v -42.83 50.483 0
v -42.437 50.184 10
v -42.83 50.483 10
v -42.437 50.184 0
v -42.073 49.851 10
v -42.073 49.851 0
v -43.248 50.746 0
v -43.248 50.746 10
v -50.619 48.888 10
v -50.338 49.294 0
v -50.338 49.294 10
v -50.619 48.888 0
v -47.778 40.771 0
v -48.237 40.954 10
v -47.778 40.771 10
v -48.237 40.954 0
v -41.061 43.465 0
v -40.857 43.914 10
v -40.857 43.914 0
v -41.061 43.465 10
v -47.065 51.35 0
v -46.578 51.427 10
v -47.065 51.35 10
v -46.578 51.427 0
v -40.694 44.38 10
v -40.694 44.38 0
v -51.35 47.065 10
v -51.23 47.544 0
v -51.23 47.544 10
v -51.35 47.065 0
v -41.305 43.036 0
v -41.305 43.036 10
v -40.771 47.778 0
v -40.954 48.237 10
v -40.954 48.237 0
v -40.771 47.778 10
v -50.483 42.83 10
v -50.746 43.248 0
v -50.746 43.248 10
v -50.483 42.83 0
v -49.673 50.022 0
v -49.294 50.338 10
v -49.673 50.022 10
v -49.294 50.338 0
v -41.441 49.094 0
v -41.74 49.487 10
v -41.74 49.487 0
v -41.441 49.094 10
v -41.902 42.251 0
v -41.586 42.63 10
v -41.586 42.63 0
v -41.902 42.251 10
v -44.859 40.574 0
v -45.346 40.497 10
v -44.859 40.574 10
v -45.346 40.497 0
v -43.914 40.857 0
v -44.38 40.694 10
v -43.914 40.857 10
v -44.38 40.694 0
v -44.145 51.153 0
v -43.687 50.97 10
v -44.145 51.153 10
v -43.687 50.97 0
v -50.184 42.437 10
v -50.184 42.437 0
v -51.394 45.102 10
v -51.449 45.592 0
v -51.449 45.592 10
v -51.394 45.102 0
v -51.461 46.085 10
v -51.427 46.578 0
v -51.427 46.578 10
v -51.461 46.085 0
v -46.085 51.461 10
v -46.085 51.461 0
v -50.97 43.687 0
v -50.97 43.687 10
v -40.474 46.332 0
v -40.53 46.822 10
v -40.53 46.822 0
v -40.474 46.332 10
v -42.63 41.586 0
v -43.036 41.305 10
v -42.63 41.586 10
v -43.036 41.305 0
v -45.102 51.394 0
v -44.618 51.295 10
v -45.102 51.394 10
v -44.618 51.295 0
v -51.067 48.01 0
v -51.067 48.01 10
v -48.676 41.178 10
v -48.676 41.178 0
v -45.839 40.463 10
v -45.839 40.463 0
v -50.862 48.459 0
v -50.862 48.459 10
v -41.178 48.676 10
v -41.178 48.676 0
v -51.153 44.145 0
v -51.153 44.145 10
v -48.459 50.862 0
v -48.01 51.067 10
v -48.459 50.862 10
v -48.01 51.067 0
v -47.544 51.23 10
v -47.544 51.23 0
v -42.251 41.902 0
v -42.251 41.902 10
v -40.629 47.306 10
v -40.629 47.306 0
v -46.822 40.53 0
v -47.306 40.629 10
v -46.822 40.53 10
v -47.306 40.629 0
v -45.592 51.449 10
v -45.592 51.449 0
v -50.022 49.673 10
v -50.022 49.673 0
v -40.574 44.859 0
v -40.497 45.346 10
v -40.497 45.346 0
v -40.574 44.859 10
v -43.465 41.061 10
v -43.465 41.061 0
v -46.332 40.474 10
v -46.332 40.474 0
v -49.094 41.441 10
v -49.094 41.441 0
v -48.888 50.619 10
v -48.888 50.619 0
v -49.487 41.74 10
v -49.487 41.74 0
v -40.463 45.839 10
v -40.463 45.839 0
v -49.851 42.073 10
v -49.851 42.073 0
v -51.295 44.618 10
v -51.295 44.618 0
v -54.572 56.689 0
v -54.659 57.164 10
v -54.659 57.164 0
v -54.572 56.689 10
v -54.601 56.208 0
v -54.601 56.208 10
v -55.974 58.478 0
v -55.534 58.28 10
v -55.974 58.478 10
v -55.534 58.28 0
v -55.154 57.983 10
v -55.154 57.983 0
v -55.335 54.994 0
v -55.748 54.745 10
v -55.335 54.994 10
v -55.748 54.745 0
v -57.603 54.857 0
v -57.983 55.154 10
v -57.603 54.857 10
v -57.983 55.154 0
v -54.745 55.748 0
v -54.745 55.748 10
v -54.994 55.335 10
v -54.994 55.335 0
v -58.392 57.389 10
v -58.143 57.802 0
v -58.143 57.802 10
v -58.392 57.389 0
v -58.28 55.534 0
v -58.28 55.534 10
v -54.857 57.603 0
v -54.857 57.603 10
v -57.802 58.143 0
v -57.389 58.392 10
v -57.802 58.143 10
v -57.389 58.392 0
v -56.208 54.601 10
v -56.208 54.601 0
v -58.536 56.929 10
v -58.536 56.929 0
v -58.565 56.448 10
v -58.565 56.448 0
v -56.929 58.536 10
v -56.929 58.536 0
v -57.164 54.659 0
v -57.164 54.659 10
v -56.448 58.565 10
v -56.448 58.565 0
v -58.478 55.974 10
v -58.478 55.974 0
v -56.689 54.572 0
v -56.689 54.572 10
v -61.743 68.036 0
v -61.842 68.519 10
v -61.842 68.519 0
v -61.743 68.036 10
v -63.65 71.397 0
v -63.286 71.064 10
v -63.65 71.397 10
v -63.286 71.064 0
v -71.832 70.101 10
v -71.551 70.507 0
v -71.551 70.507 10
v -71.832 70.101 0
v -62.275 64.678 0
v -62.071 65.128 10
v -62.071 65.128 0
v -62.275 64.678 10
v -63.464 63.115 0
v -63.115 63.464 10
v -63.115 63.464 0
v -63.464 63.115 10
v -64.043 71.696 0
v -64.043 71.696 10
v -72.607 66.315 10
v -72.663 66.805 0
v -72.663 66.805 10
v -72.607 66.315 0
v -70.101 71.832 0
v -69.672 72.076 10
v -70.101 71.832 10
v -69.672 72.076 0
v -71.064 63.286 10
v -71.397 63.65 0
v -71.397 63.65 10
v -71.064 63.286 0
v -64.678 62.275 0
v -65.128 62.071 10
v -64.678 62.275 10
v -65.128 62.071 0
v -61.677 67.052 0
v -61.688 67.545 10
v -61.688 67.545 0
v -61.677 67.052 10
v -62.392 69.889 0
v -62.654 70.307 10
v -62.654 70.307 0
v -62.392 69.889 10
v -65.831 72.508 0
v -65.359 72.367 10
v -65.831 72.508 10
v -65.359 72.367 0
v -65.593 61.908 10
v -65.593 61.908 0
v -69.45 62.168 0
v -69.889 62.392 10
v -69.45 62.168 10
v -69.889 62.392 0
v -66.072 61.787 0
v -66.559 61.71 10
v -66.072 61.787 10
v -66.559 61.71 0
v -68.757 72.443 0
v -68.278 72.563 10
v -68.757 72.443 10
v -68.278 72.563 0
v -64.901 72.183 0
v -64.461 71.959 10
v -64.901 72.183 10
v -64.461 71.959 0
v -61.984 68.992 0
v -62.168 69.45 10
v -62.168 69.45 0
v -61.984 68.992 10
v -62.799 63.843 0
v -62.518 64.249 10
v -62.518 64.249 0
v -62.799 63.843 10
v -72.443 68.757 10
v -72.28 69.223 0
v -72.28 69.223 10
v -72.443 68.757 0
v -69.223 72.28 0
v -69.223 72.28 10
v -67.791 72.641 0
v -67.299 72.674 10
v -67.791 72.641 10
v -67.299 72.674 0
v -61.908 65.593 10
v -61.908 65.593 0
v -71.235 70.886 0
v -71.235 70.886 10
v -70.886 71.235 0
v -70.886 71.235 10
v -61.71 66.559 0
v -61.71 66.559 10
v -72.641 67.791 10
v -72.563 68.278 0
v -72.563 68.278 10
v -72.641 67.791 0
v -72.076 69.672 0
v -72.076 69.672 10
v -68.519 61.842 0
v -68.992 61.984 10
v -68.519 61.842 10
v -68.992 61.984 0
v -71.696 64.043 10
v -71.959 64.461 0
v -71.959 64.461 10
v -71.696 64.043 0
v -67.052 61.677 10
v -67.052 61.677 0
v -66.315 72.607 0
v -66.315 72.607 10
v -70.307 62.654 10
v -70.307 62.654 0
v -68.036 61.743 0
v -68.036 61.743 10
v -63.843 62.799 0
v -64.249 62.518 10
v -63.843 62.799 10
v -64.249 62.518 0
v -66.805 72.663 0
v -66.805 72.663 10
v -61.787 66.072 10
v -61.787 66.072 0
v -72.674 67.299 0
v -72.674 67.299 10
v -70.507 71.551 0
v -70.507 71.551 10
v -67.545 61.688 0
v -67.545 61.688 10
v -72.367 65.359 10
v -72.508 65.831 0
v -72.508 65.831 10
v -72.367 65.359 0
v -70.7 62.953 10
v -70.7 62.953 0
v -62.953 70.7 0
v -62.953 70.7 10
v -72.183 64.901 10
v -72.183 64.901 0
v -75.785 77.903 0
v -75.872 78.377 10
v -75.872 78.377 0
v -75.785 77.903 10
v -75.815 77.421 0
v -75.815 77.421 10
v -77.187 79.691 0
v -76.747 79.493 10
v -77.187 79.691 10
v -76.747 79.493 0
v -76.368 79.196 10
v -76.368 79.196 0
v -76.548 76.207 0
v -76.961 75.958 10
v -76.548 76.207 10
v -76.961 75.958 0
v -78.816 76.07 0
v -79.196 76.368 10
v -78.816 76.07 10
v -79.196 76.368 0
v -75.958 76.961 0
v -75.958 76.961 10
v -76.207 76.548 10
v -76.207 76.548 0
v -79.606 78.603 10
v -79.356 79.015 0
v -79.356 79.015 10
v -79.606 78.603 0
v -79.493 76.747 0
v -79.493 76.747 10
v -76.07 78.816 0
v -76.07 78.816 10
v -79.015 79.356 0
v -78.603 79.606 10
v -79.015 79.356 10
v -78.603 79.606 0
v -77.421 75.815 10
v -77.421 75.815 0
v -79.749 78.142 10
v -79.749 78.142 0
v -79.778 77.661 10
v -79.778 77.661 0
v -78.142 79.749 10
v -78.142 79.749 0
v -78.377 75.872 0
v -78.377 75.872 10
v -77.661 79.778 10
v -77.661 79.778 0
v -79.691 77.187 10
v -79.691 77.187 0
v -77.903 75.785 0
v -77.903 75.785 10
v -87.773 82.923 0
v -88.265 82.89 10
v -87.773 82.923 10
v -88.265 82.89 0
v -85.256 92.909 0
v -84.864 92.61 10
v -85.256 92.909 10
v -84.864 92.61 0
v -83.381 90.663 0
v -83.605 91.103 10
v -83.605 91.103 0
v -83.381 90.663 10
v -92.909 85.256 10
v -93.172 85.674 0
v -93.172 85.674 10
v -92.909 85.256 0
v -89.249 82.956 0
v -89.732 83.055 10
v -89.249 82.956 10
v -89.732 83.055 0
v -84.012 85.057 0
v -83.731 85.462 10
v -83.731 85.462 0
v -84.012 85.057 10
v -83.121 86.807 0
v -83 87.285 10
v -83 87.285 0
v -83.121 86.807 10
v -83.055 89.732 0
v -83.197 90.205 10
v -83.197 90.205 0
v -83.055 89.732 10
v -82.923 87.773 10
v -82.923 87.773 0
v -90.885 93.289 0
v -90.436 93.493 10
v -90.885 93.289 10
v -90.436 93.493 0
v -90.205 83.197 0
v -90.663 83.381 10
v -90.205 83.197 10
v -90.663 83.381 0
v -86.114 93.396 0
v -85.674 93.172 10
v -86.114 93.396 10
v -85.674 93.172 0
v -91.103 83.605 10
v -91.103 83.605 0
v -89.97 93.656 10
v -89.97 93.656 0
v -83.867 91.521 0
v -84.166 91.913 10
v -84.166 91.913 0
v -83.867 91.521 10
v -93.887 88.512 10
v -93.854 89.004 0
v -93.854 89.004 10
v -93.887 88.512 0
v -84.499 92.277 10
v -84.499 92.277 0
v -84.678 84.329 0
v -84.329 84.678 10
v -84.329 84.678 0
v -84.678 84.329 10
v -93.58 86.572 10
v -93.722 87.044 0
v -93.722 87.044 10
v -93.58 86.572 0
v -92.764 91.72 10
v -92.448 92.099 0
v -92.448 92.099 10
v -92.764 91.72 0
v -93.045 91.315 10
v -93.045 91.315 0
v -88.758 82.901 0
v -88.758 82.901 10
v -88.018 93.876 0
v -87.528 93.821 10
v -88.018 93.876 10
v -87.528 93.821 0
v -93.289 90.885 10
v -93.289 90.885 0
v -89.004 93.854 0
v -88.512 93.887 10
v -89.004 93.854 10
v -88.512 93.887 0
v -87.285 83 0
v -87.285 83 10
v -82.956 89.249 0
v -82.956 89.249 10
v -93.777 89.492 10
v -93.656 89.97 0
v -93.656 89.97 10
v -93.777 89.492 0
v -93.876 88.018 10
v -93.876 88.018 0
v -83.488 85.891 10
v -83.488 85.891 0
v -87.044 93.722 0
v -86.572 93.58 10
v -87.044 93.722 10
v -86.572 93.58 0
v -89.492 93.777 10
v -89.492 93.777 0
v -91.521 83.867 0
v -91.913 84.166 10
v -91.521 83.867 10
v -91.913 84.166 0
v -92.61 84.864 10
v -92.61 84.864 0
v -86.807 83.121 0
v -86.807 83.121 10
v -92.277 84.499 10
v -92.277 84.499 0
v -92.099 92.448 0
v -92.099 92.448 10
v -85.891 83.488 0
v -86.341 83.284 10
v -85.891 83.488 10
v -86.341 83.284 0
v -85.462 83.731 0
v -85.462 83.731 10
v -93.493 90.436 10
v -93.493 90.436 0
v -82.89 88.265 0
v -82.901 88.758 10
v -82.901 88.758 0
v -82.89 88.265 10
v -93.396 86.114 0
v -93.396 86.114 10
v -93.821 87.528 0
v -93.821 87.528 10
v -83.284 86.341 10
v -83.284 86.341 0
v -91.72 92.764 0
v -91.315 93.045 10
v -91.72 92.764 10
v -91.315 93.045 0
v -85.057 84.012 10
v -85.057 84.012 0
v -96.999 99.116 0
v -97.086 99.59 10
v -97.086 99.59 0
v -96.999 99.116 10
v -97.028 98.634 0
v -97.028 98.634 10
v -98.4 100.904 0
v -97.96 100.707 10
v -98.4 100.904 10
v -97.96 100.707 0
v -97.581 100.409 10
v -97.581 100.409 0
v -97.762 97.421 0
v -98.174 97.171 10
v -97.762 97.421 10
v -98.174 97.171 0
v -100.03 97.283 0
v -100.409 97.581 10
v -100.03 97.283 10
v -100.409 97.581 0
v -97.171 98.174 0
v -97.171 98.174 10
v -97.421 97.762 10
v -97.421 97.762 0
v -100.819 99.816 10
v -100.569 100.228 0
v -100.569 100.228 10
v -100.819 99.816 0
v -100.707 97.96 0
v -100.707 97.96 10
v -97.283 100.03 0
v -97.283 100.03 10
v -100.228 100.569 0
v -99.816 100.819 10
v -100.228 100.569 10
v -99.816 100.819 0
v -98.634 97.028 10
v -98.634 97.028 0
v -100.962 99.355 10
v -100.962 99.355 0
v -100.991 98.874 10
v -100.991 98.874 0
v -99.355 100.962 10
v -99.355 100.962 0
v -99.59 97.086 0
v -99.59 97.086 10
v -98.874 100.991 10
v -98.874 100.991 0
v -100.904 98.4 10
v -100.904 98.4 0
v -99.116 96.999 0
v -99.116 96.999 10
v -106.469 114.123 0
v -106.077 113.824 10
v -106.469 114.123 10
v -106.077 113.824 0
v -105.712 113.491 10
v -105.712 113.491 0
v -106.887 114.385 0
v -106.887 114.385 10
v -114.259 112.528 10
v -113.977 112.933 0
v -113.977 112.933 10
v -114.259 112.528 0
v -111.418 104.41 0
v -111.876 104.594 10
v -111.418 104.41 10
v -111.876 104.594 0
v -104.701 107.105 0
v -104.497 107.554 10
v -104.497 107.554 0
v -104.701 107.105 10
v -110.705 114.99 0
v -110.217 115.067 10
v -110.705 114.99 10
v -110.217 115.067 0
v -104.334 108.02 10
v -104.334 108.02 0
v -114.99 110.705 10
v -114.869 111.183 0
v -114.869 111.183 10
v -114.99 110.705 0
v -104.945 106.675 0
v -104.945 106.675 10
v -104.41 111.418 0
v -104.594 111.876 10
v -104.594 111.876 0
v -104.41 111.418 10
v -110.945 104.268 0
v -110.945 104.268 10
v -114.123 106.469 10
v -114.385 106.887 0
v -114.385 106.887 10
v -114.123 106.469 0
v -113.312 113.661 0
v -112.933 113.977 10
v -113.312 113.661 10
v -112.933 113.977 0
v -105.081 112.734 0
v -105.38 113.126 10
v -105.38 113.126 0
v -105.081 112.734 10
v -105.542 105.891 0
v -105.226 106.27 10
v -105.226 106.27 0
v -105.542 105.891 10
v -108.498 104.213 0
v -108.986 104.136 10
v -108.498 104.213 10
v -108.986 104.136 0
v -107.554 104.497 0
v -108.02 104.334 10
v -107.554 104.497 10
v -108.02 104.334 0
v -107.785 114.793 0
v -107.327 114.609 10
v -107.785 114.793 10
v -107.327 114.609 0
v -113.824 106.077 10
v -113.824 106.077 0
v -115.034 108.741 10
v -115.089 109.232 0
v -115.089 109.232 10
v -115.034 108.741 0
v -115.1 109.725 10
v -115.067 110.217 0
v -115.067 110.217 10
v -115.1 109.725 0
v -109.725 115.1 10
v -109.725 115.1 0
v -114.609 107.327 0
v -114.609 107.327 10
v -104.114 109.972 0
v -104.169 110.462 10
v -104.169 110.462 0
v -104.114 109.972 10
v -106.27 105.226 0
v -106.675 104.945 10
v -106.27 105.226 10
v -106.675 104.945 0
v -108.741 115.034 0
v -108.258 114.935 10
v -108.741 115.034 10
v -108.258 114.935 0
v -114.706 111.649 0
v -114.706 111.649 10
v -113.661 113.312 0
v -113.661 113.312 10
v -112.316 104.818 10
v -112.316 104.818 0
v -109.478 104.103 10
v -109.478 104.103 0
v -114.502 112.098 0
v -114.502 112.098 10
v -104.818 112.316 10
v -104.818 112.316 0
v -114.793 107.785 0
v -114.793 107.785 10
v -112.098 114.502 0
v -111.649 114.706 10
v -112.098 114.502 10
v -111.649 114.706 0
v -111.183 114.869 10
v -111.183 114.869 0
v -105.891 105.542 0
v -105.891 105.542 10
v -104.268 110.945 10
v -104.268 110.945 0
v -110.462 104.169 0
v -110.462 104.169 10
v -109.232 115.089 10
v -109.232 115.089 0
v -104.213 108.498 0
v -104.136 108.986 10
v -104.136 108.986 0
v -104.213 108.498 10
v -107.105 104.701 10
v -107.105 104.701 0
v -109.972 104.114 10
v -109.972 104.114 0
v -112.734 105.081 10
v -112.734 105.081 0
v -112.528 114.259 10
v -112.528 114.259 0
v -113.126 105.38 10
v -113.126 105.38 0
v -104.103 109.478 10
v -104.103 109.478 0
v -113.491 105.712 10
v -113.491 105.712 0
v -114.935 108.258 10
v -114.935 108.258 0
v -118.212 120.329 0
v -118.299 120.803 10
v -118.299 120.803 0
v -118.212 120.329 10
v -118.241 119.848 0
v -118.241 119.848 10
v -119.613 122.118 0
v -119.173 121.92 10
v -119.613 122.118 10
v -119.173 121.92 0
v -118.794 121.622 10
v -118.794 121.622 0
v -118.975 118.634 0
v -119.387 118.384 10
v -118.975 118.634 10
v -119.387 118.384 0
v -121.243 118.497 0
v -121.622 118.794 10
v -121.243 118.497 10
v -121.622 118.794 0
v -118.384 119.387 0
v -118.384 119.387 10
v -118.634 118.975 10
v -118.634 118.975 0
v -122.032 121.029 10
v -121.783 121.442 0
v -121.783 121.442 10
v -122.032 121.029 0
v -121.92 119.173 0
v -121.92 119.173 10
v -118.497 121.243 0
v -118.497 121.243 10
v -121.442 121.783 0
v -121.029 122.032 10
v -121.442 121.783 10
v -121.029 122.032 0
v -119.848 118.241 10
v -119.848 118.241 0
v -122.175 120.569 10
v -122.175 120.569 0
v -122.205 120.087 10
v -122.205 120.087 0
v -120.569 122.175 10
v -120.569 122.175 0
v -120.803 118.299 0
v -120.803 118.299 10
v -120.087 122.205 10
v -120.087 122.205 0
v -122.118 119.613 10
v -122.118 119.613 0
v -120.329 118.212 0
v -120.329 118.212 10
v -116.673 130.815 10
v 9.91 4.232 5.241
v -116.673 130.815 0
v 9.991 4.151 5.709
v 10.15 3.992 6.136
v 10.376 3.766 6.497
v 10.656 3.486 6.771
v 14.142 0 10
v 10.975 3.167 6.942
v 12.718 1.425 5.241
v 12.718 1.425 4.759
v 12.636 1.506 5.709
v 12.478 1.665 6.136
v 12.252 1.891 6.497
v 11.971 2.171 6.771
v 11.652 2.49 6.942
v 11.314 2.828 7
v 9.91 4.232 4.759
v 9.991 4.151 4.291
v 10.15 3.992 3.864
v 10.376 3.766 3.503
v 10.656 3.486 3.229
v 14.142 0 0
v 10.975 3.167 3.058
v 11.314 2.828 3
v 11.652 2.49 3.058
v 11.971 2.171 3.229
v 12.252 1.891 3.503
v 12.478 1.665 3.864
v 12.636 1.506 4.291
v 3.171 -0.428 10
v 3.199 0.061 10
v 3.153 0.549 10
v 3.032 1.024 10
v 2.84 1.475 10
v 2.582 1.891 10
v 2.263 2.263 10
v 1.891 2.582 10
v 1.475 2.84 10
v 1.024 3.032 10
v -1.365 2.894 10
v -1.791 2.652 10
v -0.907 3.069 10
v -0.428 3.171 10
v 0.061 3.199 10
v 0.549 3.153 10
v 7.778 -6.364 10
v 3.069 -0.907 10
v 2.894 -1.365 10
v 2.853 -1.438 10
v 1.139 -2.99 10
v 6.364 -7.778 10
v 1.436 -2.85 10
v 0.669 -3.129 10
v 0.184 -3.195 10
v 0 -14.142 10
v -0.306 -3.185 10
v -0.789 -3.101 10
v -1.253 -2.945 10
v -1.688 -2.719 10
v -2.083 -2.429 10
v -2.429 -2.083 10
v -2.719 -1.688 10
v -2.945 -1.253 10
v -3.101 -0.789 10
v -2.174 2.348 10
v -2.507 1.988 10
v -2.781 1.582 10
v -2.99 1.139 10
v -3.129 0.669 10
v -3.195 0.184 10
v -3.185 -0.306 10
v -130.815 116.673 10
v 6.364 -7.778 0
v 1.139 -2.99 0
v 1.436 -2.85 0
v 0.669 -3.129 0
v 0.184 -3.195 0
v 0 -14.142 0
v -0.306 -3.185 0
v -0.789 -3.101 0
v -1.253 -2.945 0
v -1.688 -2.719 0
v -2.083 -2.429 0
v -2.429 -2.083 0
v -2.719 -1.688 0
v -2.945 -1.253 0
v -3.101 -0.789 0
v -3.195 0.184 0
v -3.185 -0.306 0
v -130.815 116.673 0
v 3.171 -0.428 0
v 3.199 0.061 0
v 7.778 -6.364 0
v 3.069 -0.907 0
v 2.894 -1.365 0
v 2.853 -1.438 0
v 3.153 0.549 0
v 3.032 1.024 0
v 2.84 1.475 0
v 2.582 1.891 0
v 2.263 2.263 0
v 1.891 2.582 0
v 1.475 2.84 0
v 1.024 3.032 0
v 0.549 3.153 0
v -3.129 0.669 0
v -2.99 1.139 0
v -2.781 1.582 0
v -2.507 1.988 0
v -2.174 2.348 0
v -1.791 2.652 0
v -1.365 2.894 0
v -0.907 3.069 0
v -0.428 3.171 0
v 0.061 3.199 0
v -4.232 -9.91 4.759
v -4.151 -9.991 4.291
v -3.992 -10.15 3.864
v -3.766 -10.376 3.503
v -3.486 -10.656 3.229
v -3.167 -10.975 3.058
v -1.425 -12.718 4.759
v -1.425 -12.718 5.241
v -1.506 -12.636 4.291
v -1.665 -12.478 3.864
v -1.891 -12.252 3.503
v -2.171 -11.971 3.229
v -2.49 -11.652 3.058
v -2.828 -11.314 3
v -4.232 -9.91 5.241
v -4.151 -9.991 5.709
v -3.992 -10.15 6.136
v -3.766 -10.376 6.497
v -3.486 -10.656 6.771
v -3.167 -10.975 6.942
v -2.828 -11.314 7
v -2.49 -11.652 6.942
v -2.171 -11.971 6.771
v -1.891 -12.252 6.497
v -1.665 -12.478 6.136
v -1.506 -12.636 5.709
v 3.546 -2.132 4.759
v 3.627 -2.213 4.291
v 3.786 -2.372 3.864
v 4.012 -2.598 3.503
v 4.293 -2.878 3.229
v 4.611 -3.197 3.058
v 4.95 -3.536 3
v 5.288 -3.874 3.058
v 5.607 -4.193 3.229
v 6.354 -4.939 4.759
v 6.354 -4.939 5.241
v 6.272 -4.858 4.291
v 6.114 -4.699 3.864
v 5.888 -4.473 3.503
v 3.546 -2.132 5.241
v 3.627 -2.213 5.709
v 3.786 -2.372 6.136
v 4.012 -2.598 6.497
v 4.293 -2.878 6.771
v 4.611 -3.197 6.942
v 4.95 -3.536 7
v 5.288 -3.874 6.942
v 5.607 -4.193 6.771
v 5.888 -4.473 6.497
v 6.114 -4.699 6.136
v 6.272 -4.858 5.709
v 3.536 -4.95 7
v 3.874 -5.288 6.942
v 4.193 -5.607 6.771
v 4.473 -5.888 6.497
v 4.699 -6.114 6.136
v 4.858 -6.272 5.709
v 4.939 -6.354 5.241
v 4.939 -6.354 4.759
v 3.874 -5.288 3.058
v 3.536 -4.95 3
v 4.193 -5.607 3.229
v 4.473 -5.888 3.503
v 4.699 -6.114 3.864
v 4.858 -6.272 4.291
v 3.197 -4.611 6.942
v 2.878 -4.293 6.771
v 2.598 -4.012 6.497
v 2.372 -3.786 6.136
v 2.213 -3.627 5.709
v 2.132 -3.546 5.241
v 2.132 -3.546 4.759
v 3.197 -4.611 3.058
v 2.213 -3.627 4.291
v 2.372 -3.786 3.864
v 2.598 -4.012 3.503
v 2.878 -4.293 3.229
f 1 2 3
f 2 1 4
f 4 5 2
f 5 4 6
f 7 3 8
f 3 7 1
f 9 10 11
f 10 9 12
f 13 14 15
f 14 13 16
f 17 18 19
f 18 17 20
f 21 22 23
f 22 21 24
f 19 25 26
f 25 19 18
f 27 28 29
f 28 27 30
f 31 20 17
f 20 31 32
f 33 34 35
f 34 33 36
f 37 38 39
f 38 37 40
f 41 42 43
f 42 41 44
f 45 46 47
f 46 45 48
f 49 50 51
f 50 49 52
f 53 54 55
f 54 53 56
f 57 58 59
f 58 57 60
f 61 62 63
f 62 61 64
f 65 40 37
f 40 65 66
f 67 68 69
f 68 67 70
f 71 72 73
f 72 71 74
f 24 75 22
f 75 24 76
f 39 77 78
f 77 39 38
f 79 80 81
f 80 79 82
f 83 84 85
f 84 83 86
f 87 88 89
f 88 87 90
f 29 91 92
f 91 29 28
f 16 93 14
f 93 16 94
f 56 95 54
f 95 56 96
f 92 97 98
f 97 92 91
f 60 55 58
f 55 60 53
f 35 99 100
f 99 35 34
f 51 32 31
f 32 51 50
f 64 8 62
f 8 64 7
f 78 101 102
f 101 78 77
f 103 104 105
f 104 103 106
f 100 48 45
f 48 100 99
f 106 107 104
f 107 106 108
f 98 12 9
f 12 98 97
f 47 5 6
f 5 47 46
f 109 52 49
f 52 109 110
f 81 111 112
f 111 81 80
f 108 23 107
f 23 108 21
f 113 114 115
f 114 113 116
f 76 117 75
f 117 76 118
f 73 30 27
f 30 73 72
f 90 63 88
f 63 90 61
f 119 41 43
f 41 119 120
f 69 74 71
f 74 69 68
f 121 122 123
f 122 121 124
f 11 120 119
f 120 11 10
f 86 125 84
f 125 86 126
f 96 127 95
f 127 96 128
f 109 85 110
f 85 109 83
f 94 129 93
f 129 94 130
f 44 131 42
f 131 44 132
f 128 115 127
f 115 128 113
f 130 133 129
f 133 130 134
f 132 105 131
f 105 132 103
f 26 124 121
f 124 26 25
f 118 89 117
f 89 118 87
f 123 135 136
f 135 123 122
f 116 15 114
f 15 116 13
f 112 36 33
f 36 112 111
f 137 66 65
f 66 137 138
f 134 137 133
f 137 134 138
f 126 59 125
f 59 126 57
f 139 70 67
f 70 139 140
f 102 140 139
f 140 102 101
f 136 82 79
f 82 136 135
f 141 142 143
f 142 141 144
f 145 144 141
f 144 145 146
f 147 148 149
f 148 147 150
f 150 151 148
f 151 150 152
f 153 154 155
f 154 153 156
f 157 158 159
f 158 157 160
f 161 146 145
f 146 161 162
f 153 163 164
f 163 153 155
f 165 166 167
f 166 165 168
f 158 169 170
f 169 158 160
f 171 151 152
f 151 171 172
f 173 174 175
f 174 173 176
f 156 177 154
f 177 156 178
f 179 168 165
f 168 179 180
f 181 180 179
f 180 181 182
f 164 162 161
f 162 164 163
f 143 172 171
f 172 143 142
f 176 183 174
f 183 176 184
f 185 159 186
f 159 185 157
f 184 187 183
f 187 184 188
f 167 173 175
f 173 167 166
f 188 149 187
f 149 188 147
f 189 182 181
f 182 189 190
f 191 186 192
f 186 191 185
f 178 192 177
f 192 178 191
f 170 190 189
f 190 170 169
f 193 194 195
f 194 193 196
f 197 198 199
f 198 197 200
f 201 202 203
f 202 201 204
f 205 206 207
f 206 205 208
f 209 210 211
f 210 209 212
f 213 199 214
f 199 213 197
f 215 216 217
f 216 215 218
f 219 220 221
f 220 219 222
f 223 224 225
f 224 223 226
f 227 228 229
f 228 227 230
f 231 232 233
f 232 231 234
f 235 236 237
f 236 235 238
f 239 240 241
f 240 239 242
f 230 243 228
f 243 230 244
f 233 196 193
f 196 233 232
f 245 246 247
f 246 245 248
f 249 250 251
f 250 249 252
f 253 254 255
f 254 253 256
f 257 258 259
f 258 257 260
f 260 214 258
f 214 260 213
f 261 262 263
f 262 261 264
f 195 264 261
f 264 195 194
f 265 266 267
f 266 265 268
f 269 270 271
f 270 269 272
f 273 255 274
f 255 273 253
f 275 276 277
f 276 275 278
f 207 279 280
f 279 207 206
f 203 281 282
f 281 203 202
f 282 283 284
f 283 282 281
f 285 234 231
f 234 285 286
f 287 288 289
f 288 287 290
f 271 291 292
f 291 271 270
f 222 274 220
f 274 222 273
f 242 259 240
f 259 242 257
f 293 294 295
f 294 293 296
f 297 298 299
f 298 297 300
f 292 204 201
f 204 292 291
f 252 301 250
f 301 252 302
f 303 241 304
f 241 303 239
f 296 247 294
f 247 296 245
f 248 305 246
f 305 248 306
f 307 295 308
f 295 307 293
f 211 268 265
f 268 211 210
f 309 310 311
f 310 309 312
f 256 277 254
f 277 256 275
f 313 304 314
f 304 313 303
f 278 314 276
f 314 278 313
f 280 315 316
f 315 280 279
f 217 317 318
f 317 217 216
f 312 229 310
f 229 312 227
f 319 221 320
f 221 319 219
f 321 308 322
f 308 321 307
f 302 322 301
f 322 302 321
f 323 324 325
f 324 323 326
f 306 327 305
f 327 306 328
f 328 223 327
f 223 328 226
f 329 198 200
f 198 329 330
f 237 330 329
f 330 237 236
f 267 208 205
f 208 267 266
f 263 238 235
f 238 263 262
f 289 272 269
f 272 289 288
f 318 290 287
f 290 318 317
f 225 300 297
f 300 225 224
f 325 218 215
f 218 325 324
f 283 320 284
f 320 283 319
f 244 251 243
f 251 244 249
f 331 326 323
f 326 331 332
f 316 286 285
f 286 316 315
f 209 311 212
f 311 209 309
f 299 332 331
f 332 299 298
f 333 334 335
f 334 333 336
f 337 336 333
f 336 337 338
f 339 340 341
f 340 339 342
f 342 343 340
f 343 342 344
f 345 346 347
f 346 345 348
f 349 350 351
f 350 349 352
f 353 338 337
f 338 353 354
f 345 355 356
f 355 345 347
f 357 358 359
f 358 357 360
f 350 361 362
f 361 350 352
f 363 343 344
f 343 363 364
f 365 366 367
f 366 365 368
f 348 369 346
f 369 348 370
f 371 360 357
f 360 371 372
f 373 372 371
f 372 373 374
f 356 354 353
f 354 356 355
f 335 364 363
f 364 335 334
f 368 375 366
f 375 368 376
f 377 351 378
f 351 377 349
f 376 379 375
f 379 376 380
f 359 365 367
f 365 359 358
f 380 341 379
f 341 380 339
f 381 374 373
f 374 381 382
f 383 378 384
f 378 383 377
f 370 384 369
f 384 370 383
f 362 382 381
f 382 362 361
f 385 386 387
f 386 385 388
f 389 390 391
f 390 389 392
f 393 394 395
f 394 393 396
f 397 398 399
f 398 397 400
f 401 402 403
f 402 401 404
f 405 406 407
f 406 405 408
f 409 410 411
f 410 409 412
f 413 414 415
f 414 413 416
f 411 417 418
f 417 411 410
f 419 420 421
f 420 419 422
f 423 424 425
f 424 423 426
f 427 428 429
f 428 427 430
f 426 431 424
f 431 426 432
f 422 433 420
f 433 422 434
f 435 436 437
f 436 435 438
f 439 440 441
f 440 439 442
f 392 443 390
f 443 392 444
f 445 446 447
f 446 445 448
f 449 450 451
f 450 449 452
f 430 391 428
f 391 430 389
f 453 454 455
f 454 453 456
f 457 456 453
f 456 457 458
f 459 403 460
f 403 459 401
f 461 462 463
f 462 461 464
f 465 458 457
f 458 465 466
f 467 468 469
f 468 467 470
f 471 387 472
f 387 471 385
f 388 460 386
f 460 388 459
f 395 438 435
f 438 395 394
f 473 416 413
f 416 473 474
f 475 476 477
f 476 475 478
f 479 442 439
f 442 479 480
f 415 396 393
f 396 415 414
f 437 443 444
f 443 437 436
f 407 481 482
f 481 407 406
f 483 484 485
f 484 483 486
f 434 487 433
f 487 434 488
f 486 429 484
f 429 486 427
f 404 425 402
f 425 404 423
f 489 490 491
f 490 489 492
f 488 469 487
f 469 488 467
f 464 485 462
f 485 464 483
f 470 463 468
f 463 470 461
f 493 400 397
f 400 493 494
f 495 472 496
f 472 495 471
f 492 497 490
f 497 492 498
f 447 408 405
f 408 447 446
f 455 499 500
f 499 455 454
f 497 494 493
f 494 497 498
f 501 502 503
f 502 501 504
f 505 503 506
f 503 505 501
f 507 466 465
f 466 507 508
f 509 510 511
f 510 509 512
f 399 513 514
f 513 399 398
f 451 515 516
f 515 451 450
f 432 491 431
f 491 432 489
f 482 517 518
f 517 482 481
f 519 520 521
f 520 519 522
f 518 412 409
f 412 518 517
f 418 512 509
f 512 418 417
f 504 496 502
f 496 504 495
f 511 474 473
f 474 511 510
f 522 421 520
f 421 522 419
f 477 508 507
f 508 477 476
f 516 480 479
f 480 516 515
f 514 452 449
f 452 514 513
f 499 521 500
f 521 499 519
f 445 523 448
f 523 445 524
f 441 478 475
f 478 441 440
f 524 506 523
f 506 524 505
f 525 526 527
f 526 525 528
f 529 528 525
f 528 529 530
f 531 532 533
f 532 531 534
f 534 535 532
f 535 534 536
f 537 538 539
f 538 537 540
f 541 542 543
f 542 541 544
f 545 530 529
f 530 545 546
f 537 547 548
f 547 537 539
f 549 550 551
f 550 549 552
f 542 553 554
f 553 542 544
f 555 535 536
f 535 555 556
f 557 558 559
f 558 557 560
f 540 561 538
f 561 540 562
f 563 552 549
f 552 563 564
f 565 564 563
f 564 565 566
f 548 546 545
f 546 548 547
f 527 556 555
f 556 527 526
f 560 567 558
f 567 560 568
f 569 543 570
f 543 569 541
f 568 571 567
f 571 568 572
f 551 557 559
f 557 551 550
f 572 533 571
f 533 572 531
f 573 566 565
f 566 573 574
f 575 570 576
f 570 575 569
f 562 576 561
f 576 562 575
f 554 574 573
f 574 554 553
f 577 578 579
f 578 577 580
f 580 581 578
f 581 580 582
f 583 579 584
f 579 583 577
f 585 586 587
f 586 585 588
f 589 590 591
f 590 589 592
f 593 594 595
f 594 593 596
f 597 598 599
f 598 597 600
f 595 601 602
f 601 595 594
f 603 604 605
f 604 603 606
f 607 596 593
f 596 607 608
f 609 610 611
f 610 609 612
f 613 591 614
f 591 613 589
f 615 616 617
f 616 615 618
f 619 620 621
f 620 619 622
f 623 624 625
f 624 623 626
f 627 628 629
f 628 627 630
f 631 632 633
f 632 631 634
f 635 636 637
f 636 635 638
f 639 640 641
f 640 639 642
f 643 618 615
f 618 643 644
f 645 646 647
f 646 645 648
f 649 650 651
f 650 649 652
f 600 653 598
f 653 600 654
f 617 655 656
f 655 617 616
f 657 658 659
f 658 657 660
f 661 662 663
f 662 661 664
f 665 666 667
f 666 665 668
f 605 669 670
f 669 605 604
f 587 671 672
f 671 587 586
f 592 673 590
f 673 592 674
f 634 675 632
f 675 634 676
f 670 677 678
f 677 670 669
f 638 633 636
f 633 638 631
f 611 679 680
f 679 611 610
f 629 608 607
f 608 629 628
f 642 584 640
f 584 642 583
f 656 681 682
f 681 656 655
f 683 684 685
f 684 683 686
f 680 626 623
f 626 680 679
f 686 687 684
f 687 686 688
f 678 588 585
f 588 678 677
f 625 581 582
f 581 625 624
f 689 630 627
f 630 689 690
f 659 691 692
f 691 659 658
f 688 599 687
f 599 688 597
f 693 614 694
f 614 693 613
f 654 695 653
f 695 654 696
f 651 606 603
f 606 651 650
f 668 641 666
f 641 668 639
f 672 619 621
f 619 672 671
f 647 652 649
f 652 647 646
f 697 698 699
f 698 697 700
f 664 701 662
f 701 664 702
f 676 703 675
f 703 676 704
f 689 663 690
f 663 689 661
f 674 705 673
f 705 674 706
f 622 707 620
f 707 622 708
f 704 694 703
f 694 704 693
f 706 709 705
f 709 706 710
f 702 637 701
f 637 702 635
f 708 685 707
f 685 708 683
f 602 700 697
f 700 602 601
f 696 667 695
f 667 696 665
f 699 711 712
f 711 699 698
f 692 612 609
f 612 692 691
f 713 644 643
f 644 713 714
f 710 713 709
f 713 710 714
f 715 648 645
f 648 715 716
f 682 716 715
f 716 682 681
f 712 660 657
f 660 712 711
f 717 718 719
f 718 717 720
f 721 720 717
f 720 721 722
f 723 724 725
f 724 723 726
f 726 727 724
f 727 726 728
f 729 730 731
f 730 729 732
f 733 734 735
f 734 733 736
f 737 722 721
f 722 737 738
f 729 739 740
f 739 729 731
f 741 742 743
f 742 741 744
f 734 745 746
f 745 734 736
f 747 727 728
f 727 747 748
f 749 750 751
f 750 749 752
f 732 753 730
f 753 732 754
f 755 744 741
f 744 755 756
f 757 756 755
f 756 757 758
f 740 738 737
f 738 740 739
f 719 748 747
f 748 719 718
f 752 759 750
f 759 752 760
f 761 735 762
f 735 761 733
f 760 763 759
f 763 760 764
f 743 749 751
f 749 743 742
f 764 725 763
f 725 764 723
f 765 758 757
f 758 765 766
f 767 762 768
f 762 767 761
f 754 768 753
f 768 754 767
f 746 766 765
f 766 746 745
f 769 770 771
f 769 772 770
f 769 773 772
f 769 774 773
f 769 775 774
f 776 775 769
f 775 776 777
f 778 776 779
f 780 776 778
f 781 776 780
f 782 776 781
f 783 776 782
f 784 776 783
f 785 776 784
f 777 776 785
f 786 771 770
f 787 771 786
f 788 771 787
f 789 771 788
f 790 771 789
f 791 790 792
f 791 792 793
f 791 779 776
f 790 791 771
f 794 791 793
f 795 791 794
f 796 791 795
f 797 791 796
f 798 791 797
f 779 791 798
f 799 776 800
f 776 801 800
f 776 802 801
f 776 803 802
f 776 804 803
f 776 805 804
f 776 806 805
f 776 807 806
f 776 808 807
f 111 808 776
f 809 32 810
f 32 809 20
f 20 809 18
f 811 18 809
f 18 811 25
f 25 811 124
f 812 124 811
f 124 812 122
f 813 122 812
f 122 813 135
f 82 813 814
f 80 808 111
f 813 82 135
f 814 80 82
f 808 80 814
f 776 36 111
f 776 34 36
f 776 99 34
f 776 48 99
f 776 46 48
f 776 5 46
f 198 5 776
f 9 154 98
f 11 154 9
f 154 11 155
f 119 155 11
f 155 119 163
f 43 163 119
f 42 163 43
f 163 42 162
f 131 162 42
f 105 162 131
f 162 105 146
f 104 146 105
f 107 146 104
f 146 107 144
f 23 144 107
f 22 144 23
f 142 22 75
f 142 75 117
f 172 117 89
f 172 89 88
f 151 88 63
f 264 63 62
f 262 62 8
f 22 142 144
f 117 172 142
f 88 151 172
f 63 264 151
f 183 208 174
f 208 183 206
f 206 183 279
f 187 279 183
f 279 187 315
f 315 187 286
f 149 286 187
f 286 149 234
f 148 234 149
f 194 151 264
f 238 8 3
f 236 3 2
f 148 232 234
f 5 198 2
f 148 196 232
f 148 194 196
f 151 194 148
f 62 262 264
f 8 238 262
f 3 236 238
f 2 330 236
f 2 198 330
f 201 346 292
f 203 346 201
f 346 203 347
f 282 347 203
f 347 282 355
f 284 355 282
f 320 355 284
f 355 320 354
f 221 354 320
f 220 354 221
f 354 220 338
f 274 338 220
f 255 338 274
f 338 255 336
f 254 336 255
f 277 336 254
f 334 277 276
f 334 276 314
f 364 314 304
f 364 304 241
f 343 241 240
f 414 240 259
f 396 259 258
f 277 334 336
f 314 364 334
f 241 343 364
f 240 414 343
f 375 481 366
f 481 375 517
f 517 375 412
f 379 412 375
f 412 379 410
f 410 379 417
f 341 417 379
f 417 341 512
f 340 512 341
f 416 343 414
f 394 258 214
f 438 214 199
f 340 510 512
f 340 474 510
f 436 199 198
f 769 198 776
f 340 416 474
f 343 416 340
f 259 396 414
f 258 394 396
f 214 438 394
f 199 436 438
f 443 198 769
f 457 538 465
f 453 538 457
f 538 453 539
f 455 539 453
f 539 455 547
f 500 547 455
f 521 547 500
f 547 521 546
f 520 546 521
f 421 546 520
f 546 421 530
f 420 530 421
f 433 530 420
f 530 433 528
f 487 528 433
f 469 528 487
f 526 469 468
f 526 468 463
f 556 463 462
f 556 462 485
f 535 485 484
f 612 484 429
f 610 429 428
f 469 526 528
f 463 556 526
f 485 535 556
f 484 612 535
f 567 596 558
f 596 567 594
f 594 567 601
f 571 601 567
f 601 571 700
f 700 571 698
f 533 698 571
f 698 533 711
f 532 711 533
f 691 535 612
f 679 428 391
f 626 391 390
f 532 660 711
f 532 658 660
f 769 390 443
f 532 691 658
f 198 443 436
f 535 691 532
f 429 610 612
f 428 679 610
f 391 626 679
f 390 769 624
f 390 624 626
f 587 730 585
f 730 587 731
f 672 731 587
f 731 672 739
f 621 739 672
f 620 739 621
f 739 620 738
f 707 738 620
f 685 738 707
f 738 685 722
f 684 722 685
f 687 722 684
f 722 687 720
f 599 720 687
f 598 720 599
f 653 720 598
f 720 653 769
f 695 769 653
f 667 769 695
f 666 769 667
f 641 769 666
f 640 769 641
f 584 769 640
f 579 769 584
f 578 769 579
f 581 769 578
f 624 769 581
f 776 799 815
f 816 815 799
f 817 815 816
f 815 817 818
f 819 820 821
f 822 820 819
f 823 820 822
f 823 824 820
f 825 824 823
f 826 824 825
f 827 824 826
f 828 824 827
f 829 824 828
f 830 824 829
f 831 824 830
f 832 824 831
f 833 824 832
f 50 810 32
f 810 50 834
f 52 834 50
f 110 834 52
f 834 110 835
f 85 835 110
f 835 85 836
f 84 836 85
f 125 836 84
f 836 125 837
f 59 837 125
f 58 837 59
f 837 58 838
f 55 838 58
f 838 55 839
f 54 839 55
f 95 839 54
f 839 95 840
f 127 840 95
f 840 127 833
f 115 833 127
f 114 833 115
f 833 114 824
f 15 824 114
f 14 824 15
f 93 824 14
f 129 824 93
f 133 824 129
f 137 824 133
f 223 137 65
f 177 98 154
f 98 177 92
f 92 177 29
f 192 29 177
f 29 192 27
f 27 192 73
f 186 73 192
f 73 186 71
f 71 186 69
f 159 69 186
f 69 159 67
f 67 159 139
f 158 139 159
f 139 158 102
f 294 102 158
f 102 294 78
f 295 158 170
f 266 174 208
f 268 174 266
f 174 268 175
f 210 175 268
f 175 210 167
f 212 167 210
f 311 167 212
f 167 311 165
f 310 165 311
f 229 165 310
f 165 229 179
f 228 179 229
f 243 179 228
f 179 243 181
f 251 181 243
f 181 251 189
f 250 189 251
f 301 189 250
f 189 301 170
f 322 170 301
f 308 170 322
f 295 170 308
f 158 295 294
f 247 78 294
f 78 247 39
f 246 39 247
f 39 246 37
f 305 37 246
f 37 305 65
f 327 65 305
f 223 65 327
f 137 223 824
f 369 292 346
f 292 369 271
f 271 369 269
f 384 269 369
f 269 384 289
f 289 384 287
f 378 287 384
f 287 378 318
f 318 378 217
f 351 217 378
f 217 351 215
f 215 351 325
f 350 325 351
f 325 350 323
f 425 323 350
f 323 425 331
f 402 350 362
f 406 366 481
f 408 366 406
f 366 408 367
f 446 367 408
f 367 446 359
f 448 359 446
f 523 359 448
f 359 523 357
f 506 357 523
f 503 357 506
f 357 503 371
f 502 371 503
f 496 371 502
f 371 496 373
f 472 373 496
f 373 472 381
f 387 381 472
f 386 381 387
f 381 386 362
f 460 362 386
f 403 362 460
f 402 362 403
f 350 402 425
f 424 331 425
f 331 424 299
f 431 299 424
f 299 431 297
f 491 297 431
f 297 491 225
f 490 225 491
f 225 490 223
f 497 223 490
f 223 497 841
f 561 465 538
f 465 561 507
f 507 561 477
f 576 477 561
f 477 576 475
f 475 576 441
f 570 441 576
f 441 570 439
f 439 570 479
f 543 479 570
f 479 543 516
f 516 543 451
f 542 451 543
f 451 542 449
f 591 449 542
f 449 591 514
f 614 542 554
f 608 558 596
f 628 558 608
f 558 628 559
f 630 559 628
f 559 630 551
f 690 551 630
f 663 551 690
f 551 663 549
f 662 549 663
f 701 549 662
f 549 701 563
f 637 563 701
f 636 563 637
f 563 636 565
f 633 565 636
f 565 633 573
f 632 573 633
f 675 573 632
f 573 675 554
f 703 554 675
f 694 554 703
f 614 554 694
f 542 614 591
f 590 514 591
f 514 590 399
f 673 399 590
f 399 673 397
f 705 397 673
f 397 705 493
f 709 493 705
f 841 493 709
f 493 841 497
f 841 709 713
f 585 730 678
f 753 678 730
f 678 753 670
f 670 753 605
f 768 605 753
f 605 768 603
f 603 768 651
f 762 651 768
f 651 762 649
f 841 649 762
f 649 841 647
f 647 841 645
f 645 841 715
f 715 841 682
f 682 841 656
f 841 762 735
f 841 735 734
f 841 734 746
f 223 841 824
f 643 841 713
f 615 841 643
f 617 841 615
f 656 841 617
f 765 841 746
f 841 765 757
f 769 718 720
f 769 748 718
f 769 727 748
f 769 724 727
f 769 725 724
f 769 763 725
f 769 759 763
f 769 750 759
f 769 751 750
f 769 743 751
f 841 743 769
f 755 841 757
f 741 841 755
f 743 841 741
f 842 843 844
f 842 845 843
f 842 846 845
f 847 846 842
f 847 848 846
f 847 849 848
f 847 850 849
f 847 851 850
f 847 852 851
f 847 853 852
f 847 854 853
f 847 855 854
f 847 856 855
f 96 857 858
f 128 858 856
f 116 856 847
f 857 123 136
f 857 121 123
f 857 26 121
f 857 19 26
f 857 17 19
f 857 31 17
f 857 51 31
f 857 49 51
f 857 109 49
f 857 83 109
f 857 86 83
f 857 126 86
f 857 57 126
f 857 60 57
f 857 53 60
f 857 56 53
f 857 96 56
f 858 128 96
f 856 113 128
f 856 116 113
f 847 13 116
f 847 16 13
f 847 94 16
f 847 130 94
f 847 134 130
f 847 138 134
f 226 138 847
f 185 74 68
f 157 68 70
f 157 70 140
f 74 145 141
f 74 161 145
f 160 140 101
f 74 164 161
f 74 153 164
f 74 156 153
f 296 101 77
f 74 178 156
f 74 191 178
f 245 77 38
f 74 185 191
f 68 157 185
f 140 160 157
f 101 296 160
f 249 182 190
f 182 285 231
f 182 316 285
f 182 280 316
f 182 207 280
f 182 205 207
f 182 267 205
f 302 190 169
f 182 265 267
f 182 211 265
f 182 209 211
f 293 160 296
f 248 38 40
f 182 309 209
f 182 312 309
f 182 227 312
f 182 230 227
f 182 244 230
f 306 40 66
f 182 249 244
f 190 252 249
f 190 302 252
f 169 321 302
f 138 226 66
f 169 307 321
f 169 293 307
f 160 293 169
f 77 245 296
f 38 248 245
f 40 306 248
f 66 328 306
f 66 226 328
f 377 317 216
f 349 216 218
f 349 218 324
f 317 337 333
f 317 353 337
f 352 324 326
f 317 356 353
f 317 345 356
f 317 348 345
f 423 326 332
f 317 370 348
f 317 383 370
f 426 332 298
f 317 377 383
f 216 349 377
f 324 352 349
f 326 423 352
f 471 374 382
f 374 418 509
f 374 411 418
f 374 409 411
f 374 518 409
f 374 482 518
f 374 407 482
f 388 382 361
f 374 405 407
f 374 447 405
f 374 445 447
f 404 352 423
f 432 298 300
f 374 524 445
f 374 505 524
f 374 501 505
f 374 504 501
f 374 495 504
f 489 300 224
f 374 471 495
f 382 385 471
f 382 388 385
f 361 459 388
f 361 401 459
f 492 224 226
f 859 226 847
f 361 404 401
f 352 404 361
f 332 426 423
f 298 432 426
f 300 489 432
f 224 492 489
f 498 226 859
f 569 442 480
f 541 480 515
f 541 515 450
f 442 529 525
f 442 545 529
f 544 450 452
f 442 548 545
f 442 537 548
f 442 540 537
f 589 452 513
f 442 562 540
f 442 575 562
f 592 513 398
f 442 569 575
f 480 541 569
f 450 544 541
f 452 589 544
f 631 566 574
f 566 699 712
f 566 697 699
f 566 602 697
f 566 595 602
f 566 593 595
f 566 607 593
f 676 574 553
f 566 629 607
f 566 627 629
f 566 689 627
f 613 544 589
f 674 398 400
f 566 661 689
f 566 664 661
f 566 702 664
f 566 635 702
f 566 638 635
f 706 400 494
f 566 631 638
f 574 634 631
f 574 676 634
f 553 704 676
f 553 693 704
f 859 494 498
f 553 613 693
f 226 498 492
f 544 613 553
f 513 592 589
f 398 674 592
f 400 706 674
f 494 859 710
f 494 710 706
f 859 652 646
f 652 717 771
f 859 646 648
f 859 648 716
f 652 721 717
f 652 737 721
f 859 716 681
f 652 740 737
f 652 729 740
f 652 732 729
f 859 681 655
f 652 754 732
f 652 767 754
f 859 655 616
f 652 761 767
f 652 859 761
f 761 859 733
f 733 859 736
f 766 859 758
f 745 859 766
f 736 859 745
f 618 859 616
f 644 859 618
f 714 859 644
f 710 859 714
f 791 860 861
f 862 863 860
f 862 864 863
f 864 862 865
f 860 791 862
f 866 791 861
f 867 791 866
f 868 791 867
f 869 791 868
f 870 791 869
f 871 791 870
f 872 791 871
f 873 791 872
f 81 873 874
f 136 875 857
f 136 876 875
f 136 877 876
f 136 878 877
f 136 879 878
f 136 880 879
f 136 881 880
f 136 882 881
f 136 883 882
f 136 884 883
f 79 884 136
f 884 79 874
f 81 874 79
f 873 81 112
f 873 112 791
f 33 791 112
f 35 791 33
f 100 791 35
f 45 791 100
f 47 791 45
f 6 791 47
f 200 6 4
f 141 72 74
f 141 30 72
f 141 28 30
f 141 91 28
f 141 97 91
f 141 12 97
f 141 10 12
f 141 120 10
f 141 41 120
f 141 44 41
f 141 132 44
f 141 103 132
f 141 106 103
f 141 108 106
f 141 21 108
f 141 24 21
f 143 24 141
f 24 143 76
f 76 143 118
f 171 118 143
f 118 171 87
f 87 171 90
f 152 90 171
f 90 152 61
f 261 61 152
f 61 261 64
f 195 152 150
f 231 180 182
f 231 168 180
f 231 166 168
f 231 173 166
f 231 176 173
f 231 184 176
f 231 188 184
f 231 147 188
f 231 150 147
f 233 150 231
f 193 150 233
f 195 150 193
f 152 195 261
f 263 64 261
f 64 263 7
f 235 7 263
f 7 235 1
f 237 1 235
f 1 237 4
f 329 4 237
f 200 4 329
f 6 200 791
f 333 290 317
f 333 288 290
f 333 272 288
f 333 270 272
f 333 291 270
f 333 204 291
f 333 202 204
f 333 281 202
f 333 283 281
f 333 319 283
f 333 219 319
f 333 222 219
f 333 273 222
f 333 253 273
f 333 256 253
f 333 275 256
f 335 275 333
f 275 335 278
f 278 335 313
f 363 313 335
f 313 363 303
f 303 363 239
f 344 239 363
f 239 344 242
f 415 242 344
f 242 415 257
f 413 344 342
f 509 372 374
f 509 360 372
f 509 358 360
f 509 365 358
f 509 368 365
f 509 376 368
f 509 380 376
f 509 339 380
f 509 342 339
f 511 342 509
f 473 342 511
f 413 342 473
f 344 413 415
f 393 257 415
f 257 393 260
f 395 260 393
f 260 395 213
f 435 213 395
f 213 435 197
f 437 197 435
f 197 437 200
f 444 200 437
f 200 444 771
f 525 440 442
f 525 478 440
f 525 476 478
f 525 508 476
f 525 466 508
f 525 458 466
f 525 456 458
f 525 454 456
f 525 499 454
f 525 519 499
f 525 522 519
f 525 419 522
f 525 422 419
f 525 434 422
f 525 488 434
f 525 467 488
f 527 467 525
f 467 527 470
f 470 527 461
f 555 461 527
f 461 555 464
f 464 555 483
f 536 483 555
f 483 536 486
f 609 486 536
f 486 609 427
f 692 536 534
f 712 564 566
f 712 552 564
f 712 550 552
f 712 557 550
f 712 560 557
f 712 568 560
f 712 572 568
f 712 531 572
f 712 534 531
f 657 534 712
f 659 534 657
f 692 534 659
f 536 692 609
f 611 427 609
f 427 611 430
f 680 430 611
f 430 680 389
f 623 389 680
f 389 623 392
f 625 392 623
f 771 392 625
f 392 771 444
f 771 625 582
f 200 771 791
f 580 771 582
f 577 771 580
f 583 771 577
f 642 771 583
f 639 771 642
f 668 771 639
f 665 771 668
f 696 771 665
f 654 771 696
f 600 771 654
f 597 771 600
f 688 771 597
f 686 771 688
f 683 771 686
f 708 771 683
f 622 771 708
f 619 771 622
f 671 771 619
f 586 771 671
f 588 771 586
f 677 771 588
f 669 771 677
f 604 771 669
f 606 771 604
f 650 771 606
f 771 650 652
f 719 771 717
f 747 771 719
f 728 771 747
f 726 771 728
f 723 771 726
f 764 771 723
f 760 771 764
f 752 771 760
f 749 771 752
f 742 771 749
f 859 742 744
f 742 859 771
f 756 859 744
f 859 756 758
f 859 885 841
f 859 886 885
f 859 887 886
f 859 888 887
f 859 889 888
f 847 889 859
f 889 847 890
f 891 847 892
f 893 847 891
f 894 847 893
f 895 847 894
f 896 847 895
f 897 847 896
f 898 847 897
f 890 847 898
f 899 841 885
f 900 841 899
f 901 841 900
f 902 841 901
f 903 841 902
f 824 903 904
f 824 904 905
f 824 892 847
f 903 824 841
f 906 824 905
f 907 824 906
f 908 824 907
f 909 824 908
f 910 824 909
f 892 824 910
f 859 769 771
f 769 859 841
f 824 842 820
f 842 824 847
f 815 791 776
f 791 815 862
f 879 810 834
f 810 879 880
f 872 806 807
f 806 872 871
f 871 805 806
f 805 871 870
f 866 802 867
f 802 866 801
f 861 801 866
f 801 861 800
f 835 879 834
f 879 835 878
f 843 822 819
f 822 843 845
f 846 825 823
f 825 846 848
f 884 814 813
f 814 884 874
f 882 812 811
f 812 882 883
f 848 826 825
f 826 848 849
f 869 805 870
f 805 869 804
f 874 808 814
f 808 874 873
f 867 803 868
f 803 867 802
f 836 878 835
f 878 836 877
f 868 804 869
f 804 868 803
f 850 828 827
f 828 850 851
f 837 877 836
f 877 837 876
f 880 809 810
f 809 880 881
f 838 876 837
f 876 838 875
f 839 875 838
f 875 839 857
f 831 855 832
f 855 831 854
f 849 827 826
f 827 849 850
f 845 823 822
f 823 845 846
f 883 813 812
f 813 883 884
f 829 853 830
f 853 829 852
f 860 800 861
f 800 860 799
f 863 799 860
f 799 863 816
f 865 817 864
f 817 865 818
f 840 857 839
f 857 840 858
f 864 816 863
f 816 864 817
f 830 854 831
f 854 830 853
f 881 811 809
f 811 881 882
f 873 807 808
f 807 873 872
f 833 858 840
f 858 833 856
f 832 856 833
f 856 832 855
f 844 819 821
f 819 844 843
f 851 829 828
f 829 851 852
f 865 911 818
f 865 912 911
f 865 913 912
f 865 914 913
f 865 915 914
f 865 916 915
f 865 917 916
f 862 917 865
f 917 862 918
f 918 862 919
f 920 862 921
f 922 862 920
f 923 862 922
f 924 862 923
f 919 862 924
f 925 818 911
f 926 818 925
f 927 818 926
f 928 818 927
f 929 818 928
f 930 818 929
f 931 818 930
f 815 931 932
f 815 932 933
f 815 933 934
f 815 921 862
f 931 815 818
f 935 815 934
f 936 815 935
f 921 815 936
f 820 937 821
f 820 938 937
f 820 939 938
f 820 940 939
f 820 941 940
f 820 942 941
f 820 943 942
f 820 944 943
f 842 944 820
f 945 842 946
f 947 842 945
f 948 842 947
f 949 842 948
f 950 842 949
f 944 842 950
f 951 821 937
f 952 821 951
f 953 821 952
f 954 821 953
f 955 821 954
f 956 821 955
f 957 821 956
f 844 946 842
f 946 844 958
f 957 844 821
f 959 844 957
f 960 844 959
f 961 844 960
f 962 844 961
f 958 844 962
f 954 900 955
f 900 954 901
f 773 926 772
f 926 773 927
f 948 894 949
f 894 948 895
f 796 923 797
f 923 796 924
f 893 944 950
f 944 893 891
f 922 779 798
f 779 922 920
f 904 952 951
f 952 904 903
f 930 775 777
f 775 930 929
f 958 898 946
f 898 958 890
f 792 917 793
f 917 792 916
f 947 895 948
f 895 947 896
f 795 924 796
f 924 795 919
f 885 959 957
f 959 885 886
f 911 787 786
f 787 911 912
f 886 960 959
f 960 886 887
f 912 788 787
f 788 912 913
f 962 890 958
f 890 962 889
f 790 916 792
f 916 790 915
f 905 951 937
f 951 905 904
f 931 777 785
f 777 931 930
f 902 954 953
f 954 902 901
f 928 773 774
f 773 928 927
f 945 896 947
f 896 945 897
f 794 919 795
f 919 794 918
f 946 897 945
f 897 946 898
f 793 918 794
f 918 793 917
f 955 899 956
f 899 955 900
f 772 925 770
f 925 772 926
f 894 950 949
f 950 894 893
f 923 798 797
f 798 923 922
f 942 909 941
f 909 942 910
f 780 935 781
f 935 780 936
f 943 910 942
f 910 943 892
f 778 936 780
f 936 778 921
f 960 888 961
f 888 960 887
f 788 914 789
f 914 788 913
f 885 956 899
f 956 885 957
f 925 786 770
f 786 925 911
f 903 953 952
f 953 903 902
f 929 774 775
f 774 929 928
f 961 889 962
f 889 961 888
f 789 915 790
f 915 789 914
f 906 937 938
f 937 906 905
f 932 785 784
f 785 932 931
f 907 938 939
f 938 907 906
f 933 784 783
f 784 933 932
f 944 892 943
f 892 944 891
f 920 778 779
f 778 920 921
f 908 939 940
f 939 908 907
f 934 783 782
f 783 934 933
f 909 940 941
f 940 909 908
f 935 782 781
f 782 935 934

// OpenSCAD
use <../../config.scad>

resolution = 4; $fs=$fs/resolution; $fa=$fa/resolution;

lg =28;
l=28;


module tige(){
    difference(){
        translate([-10, -10]) cube([20,185,10]);
        
        translate([0, 0, -1]) cylinder(r=3.2, 100, center = true);
        for(i=[1:4]){
            translate([0, 35+i*30, 0]) cylinder(r=5.5, 100, center = true);
            translate([0, 35+15+i*30, 0]) cylinder(r=2, 100, center = true);
        }
        translate([-1, -21,-1]) cube([2,20,12]);
        translate([0, -6, 5]) rotate([0,90,0]) cylinder(r=2, 100, center = true);
        
    }
                
}

module support(){
    difference(){
        union(){
            translate([-40, 0]) cube([80,25,20]);
            for(i=[0,1]){
                mirror([i,0,0])translate([15, 5, 20]) cube([20,15,20]);
            }
        }
        
        for(i=[0,1]){
            mirror([i,0,0])translate([25, 12.5, -1]) cylinder(r=2.2, 100, center = true);
        }
        for(i=[0,1]){
            translate([7,0]) mirror([i,0,0])translate([25, 10, 10]) rotate([90,0,0]) cylinder(r=4.2, 100, center = true);
        }
        
    }
                
}

module support_tme(){
    difference(){
        union(){
            translate([-40, 0]) cube([80,30,20]);
        }
        
        for(i=[0,1]){
            mirror([i,0,0])translate([16, 23, -1]) cylinder(r=2.2, 100, center = true);
        }
        for(i=[0,1]){
            mirror([i,0,0])translate([25, 10, 10]) rotate([90,0,0]) cylinder(r=4.2, 100, center = true);
        }
        
    }
                
}

mode=1;
if(mode==0){
   support_tme();
} else {
   rotate([0,0,45])tige(); 
}
